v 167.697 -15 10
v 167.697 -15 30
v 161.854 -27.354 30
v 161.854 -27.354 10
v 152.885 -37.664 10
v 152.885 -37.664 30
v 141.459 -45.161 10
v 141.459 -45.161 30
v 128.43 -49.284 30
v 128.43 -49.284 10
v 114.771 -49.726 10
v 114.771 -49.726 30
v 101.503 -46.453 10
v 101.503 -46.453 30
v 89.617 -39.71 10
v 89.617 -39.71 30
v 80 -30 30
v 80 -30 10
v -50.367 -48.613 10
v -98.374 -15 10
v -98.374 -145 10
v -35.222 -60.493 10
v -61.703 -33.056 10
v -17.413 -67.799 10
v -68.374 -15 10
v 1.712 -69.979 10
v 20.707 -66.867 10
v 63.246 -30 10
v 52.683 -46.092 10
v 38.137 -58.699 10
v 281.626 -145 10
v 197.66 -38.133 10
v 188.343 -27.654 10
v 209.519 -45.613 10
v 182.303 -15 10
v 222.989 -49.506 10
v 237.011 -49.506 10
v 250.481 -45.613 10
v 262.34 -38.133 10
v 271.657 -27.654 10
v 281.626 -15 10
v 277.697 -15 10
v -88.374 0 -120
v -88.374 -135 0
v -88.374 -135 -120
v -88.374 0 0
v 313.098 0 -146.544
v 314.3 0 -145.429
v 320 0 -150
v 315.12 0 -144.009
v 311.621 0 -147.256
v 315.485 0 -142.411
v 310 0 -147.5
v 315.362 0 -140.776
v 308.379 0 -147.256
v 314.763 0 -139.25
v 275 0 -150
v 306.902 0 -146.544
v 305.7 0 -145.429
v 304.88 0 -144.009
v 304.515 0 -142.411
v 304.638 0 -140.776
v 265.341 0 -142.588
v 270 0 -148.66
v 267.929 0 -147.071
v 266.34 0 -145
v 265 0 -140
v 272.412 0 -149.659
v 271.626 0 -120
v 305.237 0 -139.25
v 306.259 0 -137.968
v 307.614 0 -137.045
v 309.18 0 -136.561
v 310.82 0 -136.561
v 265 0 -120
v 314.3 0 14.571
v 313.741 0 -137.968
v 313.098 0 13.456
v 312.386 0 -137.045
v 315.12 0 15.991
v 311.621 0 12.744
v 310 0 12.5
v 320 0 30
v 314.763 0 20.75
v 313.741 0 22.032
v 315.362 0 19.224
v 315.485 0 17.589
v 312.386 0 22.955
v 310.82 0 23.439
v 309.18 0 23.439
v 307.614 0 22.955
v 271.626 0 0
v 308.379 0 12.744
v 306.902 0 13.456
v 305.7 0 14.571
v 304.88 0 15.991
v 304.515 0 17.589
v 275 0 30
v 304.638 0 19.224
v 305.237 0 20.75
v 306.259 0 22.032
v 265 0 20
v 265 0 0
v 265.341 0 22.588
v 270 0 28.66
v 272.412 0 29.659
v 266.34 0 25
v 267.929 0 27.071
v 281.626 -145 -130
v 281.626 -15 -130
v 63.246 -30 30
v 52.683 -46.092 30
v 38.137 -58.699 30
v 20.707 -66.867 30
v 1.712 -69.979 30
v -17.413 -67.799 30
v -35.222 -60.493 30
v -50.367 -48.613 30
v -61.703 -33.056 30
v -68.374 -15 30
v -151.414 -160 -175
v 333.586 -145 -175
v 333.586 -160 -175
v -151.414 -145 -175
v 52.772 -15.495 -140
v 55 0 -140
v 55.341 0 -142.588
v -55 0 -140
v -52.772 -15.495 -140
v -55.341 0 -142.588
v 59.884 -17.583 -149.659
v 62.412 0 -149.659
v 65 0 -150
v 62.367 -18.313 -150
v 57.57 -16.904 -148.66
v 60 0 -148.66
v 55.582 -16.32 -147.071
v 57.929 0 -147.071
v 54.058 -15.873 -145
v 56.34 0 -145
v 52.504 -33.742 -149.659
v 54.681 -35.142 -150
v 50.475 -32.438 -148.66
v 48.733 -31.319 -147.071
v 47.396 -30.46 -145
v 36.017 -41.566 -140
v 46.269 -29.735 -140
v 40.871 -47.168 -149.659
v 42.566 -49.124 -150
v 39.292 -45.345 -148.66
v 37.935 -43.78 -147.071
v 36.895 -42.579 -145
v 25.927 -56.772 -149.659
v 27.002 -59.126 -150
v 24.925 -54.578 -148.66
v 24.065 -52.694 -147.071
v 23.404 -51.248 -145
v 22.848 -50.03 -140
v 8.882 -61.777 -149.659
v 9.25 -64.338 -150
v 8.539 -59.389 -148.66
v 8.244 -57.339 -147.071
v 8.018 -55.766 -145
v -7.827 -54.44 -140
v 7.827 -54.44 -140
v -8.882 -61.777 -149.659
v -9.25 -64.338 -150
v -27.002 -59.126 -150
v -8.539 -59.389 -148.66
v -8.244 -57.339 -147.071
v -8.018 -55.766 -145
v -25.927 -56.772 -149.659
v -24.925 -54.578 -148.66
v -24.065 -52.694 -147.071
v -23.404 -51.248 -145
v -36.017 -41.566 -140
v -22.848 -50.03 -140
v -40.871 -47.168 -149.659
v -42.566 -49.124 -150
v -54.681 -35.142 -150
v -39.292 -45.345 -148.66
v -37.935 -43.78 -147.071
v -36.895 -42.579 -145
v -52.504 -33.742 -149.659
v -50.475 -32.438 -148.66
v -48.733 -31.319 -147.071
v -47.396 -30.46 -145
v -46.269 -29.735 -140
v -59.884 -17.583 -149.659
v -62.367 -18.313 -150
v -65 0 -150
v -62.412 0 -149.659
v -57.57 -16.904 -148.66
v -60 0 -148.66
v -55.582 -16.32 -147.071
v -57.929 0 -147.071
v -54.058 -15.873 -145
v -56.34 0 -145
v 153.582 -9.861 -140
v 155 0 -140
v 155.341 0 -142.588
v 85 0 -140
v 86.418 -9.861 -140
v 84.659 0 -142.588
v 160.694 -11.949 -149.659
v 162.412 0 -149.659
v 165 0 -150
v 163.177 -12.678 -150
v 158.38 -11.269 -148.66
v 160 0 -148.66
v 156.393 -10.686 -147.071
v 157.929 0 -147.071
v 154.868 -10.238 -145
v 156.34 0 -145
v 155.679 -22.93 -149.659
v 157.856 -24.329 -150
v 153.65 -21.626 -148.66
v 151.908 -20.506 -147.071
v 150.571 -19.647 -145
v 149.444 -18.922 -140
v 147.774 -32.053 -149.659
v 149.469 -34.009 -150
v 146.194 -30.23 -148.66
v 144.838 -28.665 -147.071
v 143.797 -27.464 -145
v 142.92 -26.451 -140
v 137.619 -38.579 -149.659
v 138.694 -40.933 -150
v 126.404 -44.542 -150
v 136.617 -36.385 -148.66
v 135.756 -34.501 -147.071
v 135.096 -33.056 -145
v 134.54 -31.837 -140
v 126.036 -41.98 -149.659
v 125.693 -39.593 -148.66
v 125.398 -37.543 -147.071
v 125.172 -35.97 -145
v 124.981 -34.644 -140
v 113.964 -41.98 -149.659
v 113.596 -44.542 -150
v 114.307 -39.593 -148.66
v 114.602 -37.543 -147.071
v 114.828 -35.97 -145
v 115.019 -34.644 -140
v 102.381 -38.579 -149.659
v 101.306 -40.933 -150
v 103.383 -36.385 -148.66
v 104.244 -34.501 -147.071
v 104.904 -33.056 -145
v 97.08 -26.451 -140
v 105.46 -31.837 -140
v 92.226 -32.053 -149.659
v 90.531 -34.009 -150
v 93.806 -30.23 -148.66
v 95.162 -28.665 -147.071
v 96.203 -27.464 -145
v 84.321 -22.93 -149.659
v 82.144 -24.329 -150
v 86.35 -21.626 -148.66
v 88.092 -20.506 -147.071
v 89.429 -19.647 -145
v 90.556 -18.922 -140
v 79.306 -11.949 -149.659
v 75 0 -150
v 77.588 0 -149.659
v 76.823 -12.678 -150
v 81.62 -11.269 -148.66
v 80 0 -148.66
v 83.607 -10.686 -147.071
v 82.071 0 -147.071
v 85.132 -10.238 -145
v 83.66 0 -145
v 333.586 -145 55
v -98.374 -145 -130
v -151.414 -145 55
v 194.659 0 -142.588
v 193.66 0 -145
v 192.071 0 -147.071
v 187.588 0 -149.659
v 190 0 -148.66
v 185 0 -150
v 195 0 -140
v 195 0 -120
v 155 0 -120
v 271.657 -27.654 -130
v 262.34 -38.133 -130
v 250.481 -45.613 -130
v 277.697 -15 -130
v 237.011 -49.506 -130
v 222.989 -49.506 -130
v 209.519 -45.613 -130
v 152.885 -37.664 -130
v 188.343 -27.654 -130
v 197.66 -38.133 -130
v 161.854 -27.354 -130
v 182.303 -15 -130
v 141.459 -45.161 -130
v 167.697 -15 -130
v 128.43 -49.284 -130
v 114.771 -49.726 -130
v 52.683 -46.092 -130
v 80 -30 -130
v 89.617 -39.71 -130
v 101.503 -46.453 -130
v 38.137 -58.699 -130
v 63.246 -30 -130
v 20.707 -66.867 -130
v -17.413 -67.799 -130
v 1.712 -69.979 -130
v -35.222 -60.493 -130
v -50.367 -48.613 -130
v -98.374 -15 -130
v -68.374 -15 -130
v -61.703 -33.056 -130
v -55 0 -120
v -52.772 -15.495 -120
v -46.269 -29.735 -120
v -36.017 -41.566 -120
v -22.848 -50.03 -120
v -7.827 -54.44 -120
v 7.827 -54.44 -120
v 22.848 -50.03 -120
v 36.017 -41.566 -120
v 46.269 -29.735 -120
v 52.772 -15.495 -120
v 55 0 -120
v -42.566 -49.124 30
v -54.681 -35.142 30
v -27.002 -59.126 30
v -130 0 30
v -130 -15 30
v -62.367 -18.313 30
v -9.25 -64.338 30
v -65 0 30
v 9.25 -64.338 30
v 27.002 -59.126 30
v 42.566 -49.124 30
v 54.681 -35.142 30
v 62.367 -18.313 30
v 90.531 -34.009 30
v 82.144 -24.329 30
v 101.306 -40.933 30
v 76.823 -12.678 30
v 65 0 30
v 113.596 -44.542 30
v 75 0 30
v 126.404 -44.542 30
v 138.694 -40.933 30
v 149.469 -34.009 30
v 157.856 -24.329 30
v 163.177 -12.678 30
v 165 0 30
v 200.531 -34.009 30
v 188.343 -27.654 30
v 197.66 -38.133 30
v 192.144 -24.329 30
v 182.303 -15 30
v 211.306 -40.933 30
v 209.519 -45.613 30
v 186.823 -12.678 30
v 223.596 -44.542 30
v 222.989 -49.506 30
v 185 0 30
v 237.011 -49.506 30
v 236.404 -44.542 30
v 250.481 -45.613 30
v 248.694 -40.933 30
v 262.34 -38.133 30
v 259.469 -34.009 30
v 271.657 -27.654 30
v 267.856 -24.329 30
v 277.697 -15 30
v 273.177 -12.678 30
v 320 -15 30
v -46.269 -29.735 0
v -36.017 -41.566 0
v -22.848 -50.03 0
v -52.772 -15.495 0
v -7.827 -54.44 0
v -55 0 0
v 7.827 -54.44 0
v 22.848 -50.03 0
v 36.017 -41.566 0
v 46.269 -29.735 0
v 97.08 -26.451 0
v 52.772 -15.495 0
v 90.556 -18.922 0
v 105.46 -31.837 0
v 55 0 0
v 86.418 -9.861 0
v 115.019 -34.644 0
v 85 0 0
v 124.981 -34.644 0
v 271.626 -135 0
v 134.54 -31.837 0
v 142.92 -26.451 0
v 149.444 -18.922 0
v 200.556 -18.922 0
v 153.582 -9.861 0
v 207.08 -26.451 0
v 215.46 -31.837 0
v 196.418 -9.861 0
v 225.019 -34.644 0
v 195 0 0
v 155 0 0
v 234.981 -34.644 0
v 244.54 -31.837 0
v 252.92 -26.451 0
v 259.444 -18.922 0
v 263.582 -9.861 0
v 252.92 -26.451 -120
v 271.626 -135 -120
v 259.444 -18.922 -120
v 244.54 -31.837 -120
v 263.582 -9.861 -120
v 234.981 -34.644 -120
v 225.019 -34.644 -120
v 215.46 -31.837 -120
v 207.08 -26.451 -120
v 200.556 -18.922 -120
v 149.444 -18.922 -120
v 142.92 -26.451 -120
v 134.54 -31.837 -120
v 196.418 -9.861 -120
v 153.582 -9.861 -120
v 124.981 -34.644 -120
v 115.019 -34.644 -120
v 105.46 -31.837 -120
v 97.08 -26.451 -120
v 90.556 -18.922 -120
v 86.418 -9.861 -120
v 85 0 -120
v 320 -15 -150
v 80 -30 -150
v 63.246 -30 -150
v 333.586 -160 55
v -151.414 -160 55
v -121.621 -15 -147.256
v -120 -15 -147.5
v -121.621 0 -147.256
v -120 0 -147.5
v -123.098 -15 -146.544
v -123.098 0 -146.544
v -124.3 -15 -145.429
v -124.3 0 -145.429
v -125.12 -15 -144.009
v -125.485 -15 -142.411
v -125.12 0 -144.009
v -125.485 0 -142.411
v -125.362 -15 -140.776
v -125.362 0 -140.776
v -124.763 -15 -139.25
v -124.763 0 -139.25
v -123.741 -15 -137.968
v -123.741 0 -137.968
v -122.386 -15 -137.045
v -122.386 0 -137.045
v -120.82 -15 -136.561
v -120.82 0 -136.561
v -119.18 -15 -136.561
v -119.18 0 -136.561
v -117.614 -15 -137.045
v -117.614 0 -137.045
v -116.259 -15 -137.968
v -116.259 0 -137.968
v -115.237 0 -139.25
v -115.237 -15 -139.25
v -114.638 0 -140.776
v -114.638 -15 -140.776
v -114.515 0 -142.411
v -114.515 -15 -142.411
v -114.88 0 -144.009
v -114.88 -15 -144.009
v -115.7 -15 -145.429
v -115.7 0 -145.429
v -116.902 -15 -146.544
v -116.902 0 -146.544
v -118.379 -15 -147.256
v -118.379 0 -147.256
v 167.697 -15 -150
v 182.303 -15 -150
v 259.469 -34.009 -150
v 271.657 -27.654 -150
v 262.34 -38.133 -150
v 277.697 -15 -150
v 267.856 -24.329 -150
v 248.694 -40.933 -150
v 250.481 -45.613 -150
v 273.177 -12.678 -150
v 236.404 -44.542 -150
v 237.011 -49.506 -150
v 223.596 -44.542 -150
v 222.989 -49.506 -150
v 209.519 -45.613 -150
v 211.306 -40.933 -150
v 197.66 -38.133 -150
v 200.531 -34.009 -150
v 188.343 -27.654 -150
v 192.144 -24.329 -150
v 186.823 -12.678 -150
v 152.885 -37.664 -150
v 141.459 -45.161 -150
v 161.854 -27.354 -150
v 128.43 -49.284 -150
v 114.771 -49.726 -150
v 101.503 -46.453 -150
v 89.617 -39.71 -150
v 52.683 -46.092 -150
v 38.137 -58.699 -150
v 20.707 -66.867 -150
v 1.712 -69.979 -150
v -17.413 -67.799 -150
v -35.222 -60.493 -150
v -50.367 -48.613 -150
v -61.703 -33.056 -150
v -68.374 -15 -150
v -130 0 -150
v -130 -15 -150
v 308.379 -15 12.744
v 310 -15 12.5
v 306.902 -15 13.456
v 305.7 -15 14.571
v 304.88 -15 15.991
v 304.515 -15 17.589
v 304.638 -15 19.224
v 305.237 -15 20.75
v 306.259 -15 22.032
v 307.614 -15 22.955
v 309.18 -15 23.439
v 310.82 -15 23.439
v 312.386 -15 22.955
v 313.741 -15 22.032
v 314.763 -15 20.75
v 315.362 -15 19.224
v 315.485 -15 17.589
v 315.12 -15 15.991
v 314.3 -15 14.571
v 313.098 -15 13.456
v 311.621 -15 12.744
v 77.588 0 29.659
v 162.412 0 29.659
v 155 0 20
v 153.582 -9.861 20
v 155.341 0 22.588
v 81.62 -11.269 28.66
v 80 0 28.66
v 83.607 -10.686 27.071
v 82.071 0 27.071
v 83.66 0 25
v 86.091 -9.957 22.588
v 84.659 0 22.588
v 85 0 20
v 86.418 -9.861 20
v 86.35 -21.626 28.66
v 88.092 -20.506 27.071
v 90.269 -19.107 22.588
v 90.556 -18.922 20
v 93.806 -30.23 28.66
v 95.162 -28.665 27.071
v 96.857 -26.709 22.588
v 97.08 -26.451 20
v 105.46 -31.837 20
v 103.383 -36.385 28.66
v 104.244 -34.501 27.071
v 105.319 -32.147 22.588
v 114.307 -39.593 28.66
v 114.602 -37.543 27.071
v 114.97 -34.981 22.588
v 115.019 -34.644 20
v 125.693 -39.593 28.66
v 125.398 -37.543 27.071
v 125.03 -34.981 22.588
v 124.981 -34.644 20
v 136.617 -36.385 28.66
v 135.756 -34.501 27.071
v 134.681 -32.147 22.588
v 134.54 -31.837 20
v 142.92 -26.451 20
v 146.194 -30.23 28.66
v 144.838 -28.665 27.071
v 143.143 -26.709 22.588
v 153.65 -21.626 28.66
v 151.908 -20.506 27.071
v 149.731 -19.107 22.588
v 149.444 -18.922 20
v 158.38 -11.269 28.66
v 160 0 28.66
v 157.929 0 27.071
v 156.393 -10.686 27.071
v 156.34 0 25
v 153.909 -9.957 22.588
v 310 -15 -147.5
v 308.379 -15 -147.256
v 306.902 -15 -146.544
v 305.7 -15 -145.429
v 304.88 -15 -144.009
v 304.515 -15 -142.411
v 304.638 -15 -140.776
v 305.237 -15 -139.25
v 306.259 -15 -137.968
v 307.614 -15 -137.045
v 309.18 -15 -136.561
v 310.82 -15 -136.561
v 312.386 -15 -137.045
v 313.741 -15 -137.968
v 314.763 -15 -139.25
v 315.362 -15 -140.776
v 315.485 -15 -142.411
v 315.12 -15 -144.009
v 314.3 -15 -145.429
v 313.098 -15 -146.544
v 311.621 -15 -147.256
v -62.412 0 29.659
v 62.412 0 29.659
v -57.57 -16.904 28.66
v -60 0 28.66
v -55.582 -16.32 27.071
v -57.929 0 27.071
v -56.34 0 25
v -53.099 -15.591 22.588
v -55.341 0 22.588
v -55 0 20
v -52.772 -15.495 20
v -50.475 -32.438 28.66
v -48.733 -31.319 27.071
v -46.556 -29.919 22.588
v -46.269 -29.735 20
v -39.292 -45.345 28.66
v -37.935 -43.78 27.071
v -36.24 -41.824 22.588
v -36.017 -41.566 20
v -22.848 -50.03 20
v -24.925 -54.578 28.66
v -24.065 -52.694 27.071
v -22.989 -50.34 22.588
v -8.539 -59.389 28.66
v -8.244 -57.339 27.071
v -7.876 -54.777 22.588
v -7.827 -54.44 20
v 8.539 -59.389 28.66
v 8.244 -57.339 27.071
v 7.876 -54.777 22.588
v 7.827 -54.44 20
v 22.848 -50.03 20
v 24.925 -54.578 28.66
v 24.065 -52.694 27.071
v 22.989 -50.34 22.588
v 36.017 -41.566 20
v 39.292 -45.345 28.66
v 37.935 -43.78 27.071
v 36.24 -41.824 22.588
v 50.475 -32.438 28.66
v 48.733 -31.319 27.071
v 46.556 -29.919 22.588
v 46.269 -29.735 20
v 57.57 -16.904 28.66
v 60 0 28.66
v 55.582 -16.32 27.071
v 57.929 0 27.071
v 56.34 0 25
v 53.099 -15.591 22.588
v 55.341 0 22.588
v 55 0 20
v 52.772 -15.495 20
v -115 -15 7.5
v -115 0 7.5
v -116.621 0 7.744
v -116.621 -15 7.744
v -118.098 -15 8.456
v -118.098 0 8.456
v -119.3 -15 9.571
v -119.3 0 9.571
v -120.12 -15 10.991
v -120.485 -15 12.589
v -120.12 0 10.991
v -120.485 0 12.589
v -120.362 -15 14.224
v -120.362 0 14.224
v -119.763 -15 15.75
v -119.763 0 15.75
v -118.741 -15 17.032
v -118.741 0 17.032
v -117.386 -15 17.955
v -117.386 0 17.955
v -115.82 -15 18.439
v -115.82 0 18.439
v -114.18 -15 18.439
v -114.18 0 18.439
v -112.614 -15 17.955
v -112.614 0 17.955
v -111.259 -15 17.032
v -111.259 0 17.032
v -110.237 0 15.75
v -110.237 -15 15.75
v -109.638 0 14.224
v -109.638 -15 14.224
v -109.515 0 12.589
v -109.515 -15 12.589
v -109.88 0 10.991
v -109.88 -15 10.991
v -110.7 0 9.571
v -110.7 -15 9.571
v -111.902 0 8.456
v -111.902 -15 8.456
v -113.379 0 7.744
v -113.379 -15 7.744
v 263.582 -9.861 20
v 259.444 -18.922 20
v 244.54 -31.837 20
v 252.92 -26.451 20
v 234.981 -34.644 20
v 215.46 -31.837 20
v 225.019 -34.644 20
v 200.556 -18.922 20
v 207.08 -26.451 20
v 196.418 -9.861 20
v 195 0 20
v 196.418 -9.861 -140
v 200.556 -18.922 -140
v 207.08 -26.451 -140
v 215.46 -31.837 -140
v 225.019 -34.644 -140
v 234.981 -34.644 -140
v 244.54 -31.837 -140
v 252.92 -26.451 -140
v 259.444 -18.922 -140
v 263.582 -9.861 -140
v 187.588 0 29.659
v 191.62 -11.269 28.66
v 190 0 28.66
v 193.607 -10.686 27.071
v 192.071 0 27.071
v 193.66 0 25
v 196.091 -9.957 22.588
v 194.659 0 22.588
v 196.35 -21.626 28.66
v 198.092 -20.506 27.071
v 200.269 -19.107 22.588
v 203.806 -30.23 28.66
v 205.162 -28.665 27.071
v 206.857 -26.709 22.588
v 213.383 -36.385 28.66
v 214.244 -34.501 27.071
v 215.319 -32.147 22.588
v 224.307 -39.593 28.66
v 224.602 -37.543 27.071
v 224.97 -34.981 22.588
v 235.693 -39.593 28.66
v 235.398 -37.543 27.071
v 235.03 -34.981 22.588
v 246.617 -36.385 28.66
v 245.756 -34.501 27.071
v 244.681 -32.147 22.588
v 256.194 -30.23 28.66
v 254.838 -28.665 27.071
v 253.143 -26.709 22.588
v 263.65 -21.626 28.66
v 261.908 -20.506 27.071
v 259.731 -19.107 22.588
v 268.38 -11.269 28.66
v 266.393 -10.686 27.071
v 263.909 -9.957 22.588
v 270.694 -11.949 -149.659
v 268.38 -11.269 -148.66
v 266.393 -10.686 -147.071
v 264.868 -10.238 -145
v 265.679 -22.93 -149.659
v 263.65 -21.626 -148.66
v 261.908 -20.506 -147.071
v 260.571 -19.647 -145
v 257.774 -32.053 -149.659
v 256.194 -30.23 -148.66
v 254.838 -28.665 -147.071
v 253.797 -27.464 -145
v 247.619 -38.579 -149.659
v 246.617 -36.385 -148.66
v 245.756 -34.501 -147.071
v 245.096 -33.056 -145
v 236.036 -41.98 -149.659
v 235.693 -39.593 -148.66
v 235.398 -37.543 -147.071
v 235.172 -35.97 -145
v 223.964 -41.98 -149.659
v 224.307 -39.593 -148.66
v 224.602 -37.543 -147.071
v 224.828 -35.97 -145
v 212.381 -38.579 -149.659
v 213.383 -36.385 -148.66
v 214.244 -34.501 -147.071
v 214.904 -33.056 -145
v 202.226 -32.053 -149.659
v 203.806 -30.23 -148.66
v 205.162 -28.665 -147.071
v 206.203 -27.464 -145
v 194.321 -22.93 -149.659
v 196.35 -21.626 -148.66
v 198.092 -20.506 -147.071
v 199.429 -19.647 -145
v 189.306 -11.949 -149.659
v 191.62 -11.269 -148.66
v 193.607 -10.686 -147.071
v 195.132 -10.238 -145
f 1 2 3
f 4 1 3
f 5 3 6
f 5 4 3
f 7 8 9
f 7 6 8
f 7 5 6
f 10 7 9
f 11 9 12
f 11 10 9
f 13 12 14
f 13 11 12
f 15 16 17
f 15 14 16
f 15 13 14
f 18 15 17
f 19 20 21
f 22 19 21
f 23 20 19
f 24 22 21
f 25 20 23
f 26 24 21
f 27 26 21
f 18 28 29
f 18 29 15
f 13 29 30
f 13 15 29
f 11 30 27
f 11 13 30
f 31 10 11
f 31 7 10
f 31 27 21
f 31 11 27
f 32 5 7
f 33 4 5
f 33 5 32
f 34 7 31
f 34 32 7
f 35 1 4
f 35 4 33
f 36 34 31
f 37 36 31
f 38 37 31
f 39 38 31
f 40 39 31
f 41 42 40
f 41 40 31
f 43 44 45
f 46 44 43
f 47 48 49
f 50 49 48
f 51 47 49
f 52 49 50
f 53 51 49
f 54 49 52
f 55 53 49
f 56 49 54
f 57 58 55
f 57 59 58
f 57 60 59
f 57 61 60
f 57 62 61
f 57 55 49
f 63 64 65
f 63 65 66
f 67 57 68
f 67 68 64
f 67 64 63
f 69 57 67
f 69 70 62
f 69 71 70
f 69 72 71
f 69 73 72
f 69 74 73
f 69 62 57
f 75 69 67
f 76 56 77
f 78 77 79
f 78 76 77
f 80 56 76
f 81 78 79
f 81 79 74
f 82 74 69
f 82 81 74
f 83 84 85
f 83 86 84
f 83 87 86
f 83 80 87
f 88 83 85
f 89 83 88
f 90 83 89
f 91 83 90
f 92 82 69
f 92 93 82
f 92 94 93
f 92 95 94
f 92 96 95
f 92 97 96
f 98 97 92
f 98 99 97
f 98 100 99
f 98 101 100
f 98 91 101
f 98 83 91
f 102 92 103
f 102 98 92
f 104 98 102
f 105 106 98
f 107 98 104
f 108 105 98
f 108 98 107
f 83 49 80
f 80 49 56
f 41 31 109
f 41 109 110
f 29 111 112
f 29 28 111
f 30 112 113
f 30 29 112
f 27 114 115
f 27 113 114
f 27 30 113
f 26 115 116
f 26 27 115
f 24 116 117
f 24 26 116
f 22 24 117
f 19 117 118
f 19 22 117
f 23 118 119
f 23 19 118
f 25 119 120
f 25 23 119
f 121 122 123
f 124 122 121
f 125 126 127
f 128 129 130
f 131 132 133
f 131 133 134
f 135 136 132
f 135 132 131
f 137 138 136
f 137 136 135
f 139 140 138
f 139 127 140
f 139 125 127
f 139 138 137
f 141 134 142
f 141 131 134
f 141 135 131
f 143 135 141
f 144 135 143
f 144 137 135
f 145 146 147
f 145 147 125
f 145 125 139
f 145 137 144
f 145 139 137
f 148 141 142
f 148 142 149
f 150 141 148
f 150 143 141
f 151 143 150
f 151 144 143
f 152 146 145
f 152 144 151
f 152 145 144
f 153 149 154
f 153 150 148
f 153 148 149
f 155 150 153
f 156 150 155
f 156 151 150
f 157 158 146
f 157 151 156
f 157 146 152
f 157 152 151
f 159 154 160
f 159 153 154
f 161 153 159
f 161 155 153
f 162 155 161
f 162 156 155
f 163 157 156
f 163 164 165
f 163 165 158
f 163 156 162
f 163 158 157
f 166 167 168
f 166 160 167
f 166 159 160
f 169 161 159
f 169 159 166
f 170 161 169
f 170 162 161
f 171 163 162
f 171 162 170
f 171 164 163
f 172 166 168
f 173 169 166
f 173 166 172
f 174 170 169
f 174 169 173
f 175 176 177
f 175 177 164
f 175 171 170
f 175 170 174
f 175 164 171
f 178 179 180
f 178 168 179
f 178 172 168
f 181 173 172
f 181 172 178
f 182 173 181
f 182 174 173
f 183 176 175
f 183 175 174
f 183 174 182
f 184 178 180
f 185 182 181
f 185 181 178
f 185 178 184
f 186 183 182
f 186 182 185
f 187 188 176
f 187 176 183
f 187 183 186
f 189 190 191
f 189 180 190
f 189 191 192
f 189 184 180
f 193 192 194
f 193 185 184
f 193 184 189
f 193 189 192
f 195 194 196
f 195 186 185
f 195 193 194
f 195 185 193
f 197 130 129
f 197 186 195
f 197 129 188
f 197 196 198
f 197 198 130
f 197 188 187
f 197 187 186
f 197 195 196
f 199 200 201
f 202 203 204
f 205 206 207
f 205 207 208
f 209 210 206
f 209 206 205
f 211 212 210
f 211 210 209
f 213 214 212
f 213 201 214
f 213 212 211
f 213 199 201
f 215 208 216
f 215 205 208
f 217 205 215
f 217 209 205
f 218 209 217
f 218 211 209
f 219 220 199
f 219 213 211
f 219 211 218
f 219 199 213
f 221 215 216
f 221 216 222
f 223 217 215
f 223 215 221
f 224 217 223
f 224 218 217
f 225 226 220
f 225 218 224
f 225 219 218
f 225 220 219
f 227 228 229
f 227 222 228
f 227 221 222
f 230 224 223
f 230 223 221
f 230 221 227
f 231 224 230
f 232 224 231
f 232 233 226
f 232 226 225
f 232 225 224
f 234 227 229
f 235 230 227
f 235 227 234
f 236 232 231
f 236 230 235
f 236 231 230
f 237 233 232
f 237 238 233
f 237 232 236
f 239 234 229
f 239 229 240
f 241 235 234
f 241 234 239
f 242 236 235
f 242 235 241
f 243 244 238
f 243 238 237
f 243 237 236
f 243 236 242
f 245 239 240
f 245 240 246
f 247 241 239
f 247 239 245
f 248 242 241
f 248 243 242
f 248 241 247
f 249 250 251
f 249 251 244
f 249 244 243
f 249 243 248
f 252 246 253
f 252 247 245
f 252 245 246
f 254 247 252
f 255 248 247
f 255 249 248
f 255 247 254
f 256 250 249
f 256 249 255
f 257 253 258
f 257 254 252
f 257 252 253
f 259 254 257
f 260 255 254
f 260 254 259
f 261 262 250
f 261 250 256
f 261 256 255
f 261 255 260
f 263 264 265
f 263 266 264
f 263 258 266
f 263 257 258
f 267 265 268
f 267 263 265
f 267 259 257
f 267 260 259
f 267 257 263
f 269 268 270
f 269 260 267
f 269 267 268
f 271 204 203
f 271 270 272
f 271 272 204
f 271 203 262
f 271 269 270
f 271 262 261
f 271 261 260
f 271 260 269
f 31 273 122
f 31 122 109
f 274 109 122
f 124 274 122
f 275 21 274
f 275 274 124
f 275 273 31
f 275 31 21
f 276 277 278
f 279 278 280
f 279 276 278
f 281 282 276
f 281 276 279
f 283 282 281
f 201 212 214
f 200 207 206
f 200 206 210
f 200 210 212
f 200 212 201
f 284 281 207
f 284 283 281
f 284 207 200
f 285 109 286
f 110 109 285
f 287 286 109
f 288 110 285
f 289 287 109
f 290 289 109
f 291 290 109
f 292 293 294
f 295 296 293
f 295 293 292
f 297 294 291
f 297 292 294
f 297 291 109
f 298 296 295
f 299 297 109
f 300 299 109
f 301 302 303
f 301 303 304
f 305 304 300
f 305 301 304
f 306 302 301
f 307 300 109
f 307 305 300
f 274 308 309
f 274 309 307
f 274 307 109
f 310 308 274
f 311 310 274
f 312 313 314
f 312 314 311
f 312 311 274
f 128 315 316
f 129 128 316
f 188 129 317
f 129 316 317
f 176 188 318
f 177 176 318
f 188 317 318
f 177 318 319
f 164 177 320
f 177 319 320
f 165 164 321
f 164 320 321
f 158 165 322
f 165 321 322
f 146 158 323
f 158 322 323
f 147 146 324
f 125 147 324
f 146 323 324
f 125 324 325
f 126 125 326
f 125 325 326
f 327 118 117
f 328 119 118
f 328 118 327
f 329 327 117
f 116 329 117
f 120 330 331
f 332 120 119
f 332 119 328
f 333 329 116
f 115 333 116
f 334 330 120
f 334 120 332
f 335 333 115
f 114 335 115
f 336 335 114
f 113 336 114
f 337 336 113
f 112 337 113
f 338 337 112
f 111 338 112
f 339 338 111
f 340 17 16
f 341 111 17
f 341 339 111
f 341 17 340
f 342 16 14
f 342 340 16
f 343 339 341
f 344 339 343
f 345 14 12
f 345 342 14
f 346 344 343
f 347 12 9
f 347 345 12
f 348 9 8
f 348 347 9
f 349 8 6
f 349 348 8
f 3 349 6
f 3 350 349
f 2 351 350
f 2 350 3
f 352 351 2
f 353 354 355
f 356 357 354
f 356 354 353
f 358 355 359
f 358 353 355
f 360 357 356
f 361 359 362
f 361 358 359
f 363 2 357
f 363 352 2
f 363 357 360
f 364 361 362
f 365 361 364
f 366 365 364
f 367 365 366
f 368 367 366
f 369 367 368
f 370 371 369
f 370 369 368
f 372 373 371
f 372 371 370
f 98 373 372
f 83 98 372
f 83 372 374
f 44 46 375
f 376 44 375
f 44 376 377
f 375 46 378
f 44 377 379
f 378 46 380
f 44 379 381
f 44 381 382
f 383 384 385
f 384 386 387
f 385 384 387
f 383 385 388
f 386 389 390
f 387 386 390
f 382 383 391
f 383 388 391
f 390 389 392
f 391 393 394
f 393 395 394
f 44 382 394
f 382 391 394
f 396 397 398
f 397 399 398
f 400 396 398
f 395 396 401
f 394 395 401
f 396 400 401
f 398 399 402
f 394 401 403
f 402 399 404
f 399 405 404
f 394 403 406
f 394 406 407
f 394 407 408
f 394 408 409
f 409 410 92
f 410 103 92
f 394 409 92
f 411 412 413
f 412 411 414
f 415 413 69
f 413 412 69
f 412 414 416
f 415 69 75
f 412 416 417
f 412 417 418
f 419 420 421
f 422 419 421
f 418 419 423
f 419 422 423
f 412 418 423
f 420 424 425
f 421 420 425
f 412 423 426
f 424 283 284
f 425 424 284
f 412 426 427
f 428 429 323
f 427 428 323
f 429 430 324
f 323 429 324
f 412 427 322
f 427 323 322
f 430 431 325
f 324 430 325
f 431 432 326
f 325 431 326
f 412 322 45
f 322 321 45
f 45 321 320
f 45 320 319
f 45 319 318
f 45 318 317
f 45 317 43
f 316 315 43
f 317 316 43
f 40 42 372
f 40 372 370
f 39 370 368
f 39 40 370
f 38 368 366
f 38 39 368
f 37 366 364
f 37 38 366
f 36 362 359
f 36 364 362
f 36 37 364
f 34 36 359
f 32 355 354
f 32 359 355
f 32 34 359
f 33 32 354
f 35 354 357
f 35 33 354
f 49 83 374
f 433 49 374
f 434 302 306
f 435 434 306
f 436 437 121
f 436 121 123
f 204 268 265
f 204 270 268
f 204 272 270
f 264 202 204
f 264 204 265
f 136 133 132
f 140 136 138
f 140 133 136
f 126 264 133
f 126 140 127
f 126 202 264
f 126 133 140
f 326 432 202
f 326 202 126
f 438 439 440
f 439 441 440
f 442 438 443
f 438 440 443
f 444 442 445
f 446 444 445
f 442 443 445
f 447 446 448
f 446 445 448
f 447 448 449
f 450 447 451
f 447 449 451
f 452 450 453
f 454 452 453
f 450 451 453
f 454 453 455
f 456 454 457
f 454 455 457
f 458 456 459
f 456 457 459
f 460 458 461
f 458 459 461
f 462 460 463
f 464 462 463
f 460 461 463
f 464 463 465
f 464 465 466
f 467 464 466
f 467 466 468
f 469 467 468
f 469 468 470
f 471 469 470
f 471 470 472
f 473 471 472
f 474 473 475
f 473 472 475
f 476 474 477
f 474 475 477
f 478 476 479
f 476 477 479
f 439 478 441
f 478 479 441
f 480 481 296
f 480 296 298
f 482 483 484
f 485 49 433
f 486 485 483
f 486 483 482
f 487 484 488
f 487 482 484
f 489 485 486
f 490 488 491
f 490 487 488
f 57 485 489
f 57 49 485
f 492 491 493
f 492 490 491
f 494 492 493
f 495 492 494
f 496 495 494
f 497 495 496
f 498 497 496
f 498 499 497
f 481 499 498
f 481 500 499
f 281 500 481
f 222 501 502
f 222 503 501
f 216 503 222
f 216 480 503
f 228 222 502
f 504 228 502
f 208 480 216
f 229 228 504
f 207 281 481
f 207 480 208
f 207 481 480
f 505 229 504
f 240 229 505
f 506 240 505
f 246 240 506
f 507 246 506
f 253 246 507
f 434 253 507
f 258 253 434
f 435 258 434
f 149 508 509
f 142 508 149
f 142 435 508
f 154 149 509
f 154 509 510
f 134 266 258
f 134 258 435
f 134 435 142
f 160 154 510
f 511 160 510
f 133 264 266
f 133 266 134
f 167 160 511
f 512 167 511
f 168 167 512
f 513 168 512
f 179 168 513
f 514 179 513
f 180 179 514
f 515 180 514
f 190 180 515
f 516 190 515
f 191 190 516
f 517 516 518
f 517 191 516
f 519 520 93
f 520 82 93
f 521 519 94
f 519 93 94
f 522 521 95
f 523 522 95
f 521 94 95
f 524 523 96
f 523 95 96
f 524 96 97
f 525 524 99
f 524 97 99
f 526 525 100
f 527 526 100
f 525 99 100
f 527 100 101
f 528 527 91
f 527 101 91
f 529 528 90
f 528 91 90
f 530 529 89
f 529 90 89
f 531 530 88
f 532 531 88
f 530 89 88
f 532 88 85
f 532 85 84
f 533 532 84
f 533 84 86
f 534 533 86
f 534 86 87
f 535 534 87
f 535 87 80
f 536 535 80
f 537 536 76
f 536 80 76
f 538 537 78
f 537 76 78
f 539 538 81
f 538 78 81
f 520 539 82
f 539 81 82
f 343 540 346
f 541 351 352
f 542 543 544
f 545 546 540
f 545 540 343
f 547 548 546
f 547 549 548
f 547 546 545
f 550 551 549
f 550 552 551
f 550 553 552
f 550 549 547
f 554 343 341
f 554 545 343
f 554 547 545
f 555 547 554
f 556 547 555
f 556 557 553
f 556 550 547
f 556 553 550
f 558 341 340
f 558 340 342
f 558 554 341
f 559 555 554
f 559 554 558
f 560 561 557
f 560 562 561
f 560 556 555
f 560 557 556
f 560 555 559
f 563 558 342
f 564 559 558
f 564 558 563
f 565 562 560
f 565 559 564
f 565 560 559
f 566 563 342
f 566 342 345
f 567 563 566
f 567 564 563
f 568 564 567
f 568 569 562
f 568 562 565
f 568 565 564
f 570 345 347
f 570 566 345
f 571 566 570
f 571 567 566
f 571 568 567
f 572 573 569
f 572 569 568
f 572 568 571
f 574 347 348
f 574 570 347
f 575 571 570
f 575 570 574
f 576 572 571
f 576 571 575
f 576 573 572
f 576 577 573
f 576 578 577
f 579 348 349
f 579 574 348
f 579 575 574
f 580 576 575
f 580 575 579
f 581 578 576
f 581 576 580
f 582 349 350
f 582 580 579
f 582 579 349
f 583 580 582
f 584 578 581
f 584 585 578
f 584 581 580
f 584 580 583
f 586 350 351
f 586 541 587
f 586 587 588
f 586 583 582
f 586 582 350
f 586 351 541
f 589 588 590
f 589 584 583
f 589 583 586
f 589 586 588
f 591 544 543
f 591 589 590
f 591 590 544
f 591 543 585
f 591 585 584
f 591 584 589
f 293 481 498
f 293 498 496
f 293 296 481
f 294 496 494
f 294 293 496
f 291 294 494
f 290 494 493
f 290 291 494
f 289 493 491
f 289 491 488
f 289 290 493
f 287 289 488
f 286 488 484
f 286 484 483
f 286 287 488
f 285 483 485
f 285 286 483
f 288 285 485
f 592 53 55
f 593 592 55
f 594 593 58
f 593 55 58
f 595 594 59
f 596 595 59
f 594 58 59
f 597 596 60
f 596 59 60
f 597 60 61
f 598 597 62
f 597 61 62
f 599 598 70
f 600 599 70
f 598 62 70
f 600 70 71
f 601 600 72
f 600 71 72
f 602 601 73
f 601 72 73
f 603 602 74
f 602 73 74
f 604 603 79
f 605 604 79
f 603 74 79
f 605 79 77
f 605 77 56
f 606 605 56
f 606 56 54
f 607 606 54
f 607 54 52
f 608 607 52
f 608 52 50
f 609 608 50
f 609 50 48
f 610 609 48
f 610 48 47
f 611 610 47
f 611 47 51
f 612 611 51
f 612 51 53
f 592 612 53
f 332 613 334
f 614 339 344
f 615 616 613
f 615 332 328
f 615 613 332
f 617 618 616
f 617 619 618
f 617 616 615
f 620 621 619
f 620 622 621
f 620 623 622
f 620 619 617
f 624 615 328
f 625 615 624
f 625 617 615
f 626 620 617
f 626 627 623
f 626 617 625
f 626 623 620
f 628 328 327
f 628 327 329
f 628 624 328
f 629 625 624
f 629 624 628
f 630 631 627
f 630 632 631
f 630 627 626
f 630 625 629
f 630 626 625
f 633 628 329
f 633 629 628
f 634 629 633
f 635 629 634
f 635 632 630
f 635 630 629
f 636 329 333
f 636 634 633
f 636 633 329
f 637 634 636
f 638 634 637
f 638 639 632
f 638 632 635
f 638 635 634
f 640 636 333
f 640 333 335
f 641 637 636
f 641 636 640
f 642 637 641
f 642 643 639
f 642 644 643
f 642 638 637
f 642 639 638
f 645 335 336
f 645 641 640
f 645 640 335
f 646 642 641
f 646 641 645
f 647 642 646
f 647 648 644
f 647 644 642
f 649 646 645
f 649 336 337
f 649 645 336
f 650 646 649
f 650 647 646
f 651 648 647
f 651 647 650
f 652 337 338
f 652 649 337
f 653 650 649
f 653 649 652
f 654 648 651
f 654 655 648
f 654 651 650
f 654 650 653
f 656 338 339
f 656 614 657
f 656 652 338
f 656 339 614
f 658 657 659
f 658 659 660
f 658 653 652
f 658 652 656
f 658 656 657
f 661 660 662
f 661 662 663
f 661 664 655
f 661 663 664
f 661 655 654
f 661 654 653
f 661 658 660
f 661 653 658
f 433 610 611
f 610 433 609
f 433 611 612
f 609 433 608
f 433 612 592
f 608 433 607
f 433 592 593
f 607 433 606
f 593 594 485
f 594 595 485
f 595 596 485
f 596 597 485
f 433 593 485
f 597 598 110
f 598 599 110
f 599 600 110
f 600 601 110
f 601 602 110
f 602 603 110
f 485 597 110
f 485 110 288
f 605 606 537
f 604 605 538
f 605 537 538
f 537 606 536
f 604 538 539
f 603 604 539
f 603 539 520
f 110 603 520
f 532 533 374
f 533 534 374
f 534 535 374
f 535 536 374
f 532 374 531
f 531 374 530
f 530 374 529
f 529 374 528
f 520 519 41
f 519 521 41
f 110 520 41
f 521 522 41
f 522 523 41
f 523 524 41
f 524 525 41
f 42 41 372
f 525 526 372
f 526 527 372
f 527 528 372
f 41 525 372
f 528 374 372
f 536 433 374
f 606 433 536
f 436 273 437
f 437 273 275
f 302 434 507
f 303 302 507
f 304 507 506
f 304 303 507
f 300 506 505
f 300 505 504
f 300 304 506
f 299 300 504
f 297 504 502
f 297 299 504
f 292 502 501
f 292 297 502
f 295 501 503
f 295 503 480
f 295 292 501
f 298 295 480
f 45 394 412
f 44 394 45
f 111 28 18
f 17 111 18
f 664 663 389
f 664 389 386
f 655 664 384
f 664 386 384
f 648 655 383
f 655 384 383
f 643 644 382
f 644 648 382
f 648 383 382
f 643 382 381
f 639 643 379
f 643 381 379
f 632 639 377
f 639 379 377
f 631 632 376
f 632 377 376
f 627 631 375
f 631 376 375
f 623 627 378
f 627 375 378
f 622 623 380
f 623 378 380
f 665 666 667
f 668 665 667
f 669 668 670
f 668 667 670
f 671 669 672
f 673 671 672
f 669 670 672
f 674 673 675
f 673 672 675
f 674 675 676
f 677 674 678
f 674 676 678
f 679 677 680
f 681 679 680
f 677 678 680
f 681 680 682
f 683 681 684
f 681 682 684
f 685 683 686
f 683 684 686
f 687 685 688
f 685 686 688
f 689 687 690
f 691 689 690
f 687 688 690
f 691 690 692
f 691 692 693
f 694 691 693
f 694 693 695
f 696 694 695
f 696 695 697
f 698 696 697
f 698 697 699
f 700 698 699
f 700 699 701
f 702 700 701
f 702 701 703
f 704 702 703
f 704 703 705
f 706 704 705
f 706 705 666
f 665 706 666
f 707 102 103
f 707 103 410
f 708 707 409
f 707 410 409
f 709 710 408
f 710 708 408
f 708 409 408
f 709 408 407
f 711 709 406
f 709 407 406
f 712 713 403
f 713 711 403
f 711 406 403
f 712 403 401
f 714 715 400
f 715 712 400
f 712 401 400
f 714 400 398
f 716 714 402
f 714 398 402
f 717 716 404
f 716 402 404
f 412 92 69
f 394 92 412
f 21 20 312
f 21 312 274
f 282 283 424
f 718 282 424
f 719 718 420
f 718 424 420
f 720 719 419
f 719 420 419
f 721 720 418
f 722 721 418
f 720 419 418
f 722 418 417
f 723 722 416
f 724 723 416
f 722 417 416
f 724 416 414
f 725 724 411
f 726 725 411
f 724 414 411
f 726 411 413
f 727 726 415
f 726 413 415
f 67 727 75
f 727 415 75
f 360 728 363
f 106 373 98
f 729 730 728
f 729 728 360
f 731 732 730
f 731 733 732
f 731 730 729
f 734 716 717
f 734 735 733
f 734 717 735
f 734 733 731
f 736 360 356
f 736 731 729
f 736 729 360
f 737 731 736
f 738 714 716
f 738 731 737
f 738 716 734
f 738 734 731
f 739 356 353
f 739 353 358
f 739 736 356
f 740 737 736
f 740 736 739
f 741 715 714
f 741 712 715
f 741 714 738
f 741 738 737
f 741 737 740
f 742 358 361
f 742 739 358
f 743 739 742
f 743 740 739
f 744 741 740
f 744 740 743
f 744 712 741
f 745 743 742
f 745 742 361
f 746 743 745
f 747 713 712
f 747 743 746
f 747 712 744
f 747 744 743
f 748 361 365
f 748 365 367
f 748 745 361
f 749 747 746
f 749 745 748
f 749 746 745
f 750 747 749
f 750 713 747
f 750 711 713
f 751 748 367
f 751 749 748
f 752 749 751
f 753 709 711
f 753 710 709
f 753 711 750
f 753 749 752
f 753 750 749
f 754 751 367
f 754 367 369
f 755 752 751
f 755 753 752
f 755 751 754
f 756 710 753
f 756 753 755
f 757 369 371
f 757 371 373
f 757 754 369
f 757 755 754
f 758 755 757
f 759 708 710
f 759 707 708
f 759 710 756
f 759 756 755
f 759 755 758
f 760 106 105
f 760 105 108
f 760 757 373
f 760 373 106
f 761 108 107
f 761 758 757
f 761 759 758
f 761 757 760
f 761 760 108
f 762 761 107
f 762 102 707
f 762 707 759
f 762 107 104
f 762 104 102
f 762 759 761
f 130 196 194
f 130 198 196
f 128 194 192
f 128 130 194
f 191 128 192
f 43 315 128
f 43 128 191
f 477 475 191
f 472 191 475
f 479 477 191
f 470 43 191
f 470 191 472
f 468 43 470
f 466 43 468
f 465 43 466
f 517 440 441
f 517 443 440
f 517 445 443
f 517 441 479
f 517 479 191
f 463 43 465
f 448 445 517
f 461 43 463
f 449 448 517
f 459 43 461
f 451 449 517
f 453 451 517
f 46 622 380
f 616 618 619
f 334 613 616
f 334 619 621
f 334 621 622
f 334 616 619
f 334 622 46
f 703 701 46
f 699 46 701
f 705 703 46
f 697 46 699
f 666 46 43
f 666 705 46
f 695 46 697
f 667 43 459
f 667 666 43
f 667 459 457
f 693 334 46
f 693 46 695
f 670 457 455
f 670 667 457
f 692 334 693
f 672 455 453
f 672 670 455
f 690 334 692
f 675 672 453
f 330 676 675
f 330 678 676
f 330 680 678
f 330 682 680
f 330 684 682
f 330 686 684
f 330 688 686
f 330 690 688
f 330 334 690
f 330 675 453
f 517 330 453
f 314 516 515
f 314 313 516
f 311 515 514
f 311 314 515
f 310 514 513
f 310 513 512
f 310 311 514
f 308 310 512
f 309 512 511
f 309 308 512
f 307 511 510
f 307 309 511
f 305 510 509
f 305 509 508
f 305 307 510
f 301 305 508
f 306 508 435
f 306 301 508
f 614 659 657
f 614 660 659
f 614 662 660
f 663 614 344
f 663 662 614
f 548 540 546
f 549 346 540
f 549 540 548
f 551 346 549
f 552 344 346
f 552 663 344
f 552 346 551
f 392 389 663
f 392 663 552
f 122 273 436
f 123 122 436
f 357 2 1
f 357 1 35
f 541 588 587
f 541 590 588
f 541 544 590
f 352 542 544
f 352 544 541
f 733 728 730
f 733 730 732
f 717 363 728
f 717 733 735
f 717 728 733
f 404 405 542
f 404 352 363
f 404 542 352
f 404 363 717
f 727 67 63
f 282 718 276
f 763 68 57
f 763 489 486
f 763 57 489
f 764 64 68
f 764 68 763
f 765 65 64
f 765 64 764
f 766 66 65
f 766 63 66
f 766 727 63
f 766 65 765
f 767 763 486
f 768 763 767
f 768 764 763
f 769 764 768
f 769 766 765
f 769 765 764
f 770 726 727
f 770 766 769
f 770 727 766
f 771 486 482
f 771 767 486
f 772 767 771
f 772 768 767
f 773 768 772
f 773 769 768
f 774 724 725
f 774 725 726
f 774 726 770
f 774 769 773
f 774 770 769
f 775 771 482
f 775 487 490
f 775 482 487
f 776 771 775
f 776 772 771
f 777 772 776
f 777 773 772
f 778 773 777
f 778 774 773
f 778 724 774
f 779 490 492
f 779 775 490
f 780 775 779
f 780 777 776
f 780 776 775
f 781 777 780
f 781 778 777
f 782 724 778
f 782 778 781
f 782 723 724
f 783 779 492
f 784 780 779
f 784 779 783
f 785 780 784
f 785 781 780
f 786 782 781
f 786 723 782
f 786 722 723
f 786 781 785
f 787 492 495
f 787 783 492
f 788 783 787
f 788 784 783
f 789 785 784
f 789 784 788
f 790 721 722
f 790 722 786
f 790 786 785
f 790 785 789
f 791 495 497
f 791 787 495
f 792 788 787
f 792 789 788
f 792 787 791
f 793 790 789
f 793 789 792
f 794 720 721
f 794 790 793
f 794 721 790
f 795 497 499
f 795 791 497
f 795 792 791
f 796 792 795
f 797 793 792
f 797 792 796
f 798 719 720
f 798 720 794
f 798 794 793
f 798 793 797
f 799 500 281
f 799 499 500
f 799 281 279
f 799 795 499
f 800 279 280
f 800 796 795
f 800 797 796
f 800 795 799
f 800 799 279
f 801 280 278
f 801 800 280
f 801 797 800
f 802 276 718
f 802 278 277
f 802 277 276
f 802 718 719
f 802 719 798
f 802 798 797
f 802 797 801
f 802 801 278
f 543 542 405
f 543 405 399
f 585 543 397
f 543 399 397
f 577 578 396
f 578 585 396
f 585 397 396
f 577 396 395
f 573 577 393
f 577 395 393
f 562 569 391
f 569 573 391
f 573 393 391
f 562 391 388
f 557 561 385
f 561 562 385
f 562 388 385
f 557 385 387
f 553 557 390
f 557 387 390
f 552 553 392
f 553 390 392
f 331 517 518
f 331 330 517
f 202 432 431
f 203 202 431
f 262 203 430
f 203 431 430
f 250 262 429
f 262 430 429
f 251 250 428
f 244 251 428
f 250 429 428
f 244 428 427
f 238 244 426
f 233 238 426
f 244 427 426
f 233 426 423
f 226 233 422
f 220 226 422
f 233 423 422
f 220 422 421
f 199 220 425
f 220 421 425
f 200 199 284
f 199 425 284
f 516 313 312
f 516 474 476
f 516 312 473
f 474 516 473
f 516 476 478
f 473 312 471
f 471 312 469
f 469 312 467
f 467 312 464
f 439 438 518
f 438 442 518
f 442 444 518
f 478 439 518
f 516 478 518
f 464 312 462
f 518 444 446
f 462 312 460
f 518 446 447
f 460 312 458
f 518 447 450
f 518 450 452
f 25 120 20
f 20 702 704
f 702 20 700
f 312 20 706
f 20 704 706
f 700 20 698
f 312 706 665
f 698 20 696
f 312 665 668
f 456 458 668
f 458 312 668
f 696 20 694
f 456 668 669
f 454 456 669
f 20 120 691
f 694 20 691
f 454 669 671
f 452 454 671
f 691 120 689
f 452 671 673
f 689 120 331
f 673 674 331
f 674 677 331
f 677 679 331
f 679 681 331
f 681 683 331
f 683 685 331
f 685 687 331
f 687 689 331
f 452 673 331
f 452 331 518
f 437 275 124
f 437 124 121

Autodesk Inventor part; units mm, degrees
ref_plane "YZ Plane" through (0, 0, 0) normal (1, 0, 0) x (0, 1, 0)
ref_plane "XZ Plane" through (0, 0, 0) normal (0, 1, 0) x (-1, 0, 0)
sketch "Sketch1" plane through (0, 0, 0) normal (0, 0, 1) x (1, 0, 0)
  arc A0 (-55, 0) -> (55, 0) centre (0, 0) ccw
  arc A1 (-70, 0) -> (63.2456, -30) centre (0, 0) ccw
  arc A2 (85, 0) -> (155, 0) centre (120, 0) ccw
  arc A3 (80, -30) -> (167.697, -15) centre (120, 0) ccw
  arc A4 (195, 0) -> (265, 0) centre (230, 0) ccw
  arc A5 (182.303, -15) -> (277.697, -15) centre (230, 0) ccw
  line L0 (-130, 0) -> (-130, -15)
  line L1 (320, -15) -> (320, 0)
  line L2 (-130, -15) -> (-68.374, -15)
  line L3 (-130, 0) -> (-55, 0)
  line L4 (63.2456, -30) -> (80, -30)
  line L5 (167.697, -15) -> (182.303, -15)
  line L6 (277.697, -15) -> (320, -15)
  line L7 (265, 0) -> (320, 0)
  line L8 (55, 0) -> (85, 0)
  line L9 (155, 0) -> (195, 0)
  line L10 (-98.374, -15) -> (-98.374, -145)
  line L11 (-98.374, -145) -> (281.626, -145)
  line L12 (281.626, -145) -> (281.626, -15)
  dimension "d0" = 110
  dimension "d1" = 140
  dimension "d2" = 70
  dimension "d3" = 100
  dimension "d4" = 70
  dimension "d5" = 100
  dimension "d10" = 15
  dimension "d12" = 130
  dimension "d70" = 120
  dimension "d71" = 110
  dimension "d72" = 380
  dimension "d75" = 130
  dimension "d76" = 30
  dimension "d77" = 15
  dimension "d92" = 450
extrude "Extrusion1" add sketch "Sketch1" along normal blind 30 contours A0 L8 A2 L9 A4 L7 L1 L6 A5 L5 A3 L4 A1 L3 | A1 L2 L0 L3
extrude "Extrusion2" add sketch "Sketch1" along normal blind 10 contours A1 L4 A3 L5 A5 L6 L12 L11 L10 L2
sketch "Sketch2" plane through (0, 0, 0) normal (0, 0, -1) x (-1, 0, 0)
  line L0 (-281.626, -145) -> (-281.626, -15) projected
  line L1 (98.374, -145) -> (-281.626, -145) projected
  line L2 (98.374, -15) -> (98.374, -145) projected
  line L3 (-271.626, -15) -> (-271.626, -135)
  line L4 (-271.626, -135) -> (88.374, -135)
  line L5 (88.374, -135) -> (88.374, -15)
  line L6 (-281.626, -15) -> (-320, -15) projected
  line L7 (130, -15) -> (98.374, -15) projected
  line L8 (-281.626, -15) -> (-271.626, -15)
  line L9 (88.374, -15) -> (98.374, -15)
  point P0 (0, 0)
  dimension "d19" = 10
extrude "Extrusion3" add sketch "Sketch2" along normal blind 130
ref_plane "Work Plane1" through (0, 0, -60) normal (0, 0, -1) x (-1, 0, 0)
mirror "Mirror1" about plane through (0, 0, -60) normal (0, 0, -1) of "Extrusion1", "Extrusion2"
sketch "Sketch3" plane through (0, 0, -60) normal (0, 0, -1) x (-1, 0, 0)
  line L0 (88.374, -135) -> (88.374, -15) projected
  line L1 (130, 0) -> (130, -15) projected
  line L2 (88.374, -15) -> (130, -15)
  line L3 (130, -15) -> (130, 0)
  line L4 (130, 0) -> (88.374, 0)
  line L5 (88.374, 0) -> (88.374, -15)
  line L6 (-271.626, -15) -> (-271.626, -135) projected
  line L7 (-320, 0) -> (-265, 0) projected
  line L8 (-271.626, -15) -> (-320, -15)
  line L9 (-320, -15) -> (-320, 0)
  line L10 (-320, 0) -> (-271.626, 0)
  line L11 (-271.626, 0) -> (-271.626, -15)
  point P0 (0, 0)
  point P1 (-271.626, 0)
extrude "Extrusion4" add sketch "Sketch3" along normal through all both and the other way through all
sketch "Sketch4" plane through (0, 0, -60) normal (0, 0, -1) x (-1, 0, 0)
  line L0 (-281.626, -15) -> (-281.626, -145) projected
  line L1 (-333.586, -145) -> (151.414, -145)
  line L2 (151.414, -145) -> (151.414, -160)
  line L3 (151.414, -160) -> (-333.586, -160)
  line L4 (-333.586, -145) -> (-333.586, -160)
  point P0 (0, 0)
  dimension "d29" = 51.96
  dimension "d30" = 485
  dimension "d31" = 15
extrude "Extrusion5" add sketch "Sketch4" along normal mid plane 230
fillet "Fillet1" radius 10 6 edges at (0, -55, 30) (120, -35, 30) (230, -35, 30) (230, -35, -150) (120, -35, -150) (0, -55, -150)
sketch "Sketch9" plane through (-130, -15, 30) normal (0, -1, 0) x (1, 0, 0)
  point P0 (15, -17)
hole "Hole5" at (-115, -15, 13) direction (0, 1, 0) diameter 11 depth 15
sketch "Sketch10" plane through (-130, -15, 30) normal (0, -1, 0) x (1, 0, 0)
  point P0 (10, -172)
hole "Hole6" at (-120, -15, -142) direction (0, 1, 0) diameter 11 depth 15
sketch "Sketch11" plane through (277.697, -15, 30) normal (0, -1, 0) x (1, 0, 0)
  point P0 (32.303, -172)
hole "Hole7" at (310, -15, -142) direction (0, 1, 0) diameter 11 depth 15
sketch "Sketch12" plane through (277.697, -15, 30) normal (0, -1, 0) x (1, 0, 0)
  point P0 (32.303, -12)
hole "Hole8" at (310, -15, 18) direction (0, 1, 0) diameter 11 depth 15
